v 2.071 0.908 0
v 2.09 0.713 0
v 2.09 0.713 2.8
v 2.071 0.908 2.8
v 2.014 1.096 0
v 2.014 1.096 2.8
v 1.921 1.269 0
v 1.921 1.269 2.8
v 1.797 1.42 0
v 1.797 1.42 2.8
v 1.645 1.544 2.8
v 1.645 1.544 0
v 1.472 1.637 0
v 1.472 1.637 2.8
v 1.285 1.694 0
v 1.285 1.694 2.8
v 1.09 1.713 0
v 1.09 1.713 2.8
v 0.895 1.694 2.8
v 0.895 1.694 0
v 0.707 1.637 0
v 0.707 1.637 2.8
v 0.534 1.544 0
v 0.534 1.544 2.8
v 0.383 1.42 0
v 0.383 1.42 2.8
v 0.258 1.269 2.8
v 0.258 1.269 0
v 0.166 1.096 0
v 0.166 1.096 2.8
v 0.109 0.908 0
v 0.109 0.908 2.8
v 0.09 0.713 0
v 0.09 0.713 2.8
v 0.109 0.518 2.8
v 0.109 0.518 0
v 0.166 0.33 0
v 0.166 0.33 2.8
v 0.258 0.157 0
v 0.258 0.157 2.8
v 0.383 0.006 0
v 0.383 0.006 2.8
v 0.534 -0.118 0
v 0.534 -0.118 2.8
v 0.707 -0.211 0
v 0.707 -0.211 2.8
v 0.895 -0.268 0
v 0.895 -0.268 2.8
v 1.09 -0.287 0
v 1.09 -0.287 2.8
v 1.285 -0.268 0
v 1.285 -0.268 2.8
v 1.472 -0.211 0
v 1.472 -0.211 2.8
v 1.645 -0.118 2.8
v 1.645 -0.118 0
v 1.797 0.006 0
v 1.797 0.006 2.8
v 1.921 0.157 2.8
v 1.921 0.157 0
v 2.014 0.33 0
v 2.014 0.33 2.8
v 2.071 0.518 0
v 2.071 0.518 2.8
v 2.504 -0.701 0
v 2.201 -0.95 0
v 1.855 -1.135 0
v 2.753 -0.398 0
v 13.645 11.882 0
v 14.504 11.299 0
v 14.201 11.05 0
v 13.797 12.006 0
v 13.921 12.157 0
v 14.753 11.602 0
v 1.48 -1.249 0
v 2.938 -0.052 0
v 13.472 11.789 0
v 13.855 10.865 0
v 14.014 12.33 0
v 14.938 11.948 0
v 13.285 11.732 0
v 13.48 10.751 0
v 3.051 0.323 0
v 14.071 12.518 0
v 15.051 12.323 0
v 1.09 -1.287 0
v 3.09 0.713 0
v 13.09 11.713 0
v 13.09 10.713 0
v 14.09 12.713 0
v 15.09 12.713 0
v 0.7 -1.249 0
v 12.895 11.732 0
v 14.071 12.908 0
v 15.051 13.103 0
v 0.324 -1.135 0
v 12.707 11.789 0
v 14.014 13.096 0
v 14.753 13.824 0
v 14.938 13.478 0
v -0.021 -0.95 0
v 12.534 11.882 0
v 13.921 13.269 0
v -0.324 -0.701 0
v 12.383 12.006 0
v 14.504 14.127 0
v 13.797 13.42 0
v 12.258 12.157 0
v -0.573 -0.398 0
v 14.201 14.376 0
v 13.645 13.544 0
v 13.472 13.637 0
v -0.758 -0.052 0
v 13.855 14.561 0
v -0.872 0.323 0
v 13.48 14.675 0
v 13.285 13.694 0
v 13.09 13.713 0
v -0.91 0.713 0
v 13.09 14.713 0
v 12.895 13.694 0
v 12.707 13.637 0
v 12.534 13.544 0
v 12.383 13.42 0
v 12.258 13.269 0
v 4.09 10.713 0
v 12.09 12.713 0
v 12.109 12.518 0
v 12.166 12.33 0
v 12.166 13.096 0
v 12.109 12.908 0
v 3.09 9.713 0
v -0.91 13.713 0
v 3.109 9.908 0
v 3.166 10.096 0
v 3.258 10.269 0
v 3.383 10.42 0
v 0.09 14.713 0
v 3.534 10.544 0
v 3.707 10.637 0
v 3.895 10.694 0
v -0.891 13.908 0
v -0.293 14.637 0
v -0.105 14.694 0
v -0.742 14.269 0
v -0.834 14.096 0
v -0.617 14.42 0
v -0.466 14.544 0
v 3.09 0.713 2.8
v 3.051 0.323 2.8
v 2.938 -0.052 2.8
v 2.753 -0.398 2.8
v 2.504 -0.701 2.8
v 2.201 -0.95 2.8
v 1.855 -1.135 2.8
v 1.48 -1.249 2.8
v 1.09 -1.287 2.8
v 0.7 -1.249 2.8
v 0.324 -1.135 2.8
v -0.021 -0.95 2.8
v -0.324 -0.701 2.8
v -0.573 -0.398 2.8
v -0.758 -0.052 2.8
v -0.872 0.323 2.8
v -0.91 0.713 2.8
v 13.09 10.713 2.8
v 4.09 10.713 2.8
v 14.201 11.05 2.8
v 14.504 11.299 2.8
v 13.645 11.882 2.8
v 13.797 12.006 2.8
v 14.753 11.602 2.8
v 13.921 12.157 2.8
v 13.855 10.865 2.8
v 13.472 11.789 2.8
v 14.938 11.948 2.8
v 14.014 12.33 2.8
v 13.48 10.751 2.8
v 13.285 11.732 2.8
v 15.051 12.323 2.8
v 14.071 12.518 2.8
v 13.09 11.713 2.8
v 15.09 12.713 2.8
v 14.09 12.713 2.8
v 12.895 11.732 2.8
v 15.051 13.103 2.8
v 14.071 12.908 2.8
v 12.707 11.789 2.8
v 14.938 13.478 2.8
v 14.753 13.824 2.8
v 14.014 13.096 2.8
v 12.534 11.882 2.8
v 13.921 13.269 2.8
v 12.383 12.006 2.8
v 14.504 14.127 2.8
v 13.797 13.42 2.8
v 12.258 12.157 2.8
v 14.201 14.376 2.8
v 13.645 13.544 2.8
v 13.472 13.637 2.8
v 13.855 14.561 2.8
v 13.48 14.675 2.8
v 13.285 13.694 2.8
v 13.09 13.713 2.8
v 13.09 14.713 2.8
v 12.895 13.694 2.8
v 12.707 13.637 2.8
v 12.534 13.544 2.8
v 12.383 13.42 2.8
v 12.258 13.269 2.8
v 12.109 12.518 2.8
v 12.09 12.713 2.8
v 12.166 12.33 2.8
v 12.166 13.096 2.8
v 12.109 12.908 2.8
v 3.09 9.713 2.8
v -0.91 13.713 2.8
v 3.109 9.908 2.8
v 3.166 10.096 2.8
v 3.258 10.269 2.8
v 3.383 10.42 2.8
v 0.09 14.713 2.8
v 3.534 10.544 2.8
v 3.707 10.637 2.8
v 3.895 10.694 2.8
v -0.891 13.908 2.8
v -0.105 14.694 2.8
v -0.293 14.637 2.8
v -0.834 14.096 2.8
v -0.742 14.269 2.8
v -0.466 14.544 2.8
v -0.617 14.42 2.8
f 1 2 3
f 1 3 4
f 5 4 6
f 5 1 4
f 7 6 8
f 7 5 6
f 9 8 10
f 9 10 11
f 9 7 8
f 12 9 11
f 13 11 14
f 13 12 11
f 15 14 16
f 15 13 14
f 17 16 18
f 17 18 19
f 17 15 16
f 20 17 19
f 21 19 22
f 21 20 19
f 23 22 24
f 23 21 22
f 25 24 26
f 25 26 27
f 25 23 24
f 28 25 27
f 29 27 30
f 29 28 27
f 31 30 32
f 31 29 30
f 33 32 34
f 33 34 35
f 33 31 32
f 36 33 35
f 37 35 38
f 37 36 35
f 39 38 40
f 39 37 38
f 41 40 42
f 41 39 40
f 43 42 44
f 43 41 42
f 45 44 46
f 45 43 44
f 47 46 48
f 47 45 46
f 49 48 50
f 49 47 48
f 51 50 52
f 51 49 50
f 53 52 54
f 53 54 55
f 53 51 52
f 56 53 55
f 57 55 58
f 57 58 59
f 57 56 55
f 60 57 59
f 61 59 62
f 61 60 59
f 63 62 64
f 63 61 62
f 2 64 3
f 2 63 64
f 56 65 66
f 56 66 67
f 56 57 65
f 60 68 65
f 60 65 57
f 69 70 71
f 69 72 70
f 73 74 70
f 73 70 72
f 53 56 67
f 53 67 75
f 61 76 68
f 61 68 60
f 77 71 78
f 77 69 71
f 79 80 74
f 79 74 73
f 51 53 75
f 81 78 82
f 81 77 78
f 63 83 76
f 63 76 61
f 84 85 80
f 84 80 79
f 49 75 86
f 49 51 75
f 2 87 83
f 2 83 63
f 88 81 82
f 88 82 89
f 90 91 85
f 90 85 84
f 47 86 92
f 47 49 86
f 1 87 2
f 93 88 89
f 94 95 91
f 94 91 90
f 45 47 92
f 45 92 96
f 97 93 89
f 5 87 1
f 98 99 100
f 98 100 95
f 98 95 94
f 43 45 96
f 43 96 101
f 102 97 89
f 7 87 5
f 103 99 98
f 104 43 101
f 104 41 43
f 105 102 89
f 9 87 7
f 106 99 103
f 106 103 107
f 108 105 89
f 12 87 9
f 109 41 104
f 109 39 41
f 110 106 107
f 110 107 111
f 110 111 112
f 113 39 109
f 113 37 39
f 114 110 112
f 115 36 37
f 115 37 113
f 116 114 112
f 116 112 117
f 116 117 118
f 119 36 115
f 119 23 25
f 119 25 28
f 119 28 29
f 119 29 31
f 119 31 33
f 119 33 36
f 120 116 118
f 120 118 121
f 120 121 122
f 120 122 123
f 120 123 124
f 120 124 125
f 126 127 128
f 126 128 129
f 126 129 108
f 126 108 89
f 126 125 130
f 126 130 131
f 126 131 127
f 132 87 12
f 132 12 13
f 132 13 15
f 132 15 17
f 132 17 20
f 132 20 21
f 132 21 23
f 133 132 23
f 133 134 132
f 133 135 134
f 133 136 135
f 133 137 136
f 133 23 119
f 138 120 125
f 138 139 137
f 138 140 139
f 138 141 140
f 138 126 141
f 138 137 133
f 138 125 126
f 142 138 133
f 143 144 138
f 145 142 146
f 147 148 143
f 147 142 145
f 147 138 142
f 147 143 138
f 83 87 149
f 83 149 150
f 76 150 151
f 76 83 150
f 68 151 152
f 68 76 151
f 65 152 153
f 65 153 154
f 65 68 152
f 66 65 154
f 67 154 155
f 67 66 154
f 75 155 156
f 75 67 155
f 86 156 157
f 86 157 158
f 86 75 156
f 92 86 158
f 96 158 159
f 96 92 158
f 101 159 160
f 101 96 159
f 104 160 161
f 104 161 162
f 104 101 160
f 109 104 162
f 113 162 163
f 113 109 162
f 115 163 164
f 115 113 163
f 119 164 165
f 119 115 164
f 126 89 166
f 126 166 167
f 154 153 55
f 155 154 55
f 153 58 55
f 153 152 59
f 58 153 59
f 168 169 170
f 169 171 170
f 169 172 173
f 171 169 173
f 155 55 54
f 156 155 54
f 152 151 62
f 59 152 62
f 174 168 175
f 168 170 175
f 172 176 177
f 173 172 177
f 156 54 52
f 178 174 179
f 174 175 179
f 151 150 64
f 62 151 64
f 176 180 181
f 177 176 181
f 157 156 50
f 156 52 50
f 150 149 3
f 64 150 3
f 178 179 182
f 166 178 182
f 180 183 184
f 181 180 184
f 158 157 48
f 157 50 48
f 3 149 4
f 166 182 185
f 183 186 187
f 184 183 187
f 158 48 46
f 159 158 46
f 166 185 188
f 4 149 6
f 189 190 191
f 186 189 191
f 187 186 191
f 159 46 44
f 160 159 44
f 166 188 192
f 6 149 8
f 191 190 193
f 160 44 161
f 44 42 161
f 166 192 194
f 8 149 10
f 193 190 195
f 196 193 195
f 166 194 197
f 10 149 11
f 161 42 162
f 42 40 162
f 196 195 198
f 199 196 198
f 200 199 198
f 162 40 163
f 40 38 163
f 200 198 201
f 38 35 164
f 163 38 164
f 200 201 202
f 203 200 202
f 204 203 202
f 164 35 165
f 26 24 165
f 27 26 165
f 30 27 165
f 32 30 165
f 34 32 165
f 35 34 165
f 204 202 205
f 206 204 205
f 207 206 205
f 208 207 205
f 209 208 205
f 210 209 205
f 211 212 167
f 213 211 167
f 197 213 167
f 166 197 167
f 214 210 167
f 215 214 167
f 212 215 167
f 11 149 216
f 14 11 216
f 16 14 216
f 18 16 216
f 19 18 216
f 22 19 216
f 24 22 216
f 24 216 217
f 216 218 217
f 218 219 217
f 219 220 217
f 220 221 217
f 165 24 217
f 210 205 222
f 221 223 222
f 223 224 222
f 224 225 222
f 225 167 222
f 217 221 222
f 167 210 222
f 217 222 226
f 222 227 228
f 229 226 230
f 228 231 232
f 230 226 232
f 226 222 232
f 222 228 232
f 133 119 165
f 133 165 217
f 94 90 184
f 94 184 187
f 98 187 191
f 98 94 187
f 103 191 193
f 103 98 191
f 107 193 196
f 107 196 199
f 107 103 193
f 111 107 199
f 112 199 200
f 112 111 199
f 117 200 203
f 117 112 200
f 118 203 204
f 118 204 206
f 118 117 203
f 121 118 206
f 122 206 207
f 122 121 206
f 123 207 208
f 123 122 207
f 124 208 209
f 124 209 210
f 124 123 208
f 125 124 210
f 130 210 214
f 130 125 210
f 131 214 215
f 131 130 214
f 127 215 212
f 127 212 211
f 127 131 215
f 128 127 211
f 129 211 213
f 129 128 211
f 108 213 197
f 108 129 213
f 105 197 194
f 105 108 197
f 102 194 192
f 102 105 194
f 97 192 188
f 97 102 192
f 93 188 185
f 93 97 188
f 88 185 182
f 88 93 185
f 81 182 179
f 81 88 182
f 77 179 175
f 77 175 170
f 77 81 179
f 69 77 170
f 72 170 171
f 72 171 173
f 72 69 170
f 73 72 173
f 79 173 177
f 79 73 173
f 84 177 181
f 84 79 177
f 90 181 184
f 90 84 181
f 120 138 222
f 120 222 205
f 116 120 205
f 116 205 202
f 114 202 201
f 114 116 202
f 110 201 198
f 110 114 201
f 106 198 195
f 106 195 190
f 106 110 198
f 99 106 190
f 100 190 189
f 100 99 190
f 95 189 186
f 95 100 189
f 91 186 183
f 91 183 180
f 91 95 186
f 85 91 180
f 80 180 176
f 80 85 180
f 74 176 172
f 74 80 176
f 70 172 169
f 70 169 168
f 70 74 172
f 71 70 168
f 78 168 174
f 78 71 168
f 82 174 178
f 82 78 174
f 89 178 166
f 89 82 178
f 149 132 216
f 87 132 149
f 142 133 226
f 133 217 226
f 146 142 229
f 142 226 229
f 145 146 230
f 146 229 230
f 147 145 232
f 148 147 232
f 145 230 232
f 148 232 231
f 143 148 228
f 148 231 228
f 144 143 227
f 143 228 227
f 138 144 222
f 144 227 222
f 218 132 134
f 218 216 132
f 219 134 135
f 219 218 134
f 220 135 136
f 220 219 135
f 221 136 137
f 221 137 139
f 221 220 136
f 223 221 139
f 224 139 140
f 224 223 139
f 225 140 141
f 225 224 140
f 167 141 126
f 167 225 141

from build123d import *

# Parameters (mm, degrees)
SKETCH1_R           = 1
BOSS_EXTRUDE2_DEPTH = 2.8
FILLET1_R           = 1


with BuildPart() as part:
    # Sketch1 → Boss-Extrude2 (new body)
    with BuildSketch(Plane.XY):
        with BuildLine():
            Line((-0.910186913, 0.71299639), (-0.910186913, 14.71299639))
            Line((-0.910186913, 14.71299639), (13.089813087, 14.71299639))
            ThreePointArc((13.089813087, 14.71299639), (15.089813087, 12.71299639), (13.089813087, 10.71299639))
            Line((13.089813087, 10.71299639), (3.089813087, 10.71299639))
            Line((3.089813087, 10.71299639), (3.089813087, 0.71299639))
            ThreePointArc((3.089813087, 0.71299639), (1.089813087, -1.28700361), (-0.910186913, 0.71299639))
        make_face()
        with Locations((1.089813087, 0.71299639)):
            Circle(SKETCH1_R, mode=Mode.SUBTRACT)
        with Locations((13.089813087, 12.71299639)):
            Circle(SKETCH1_R, mode=Mode.SUBTRACT)
    extrude(amount=BOSS_EXTRUDE2_DEPTH)

    # Fillet1
    fillet1_edges = [part.edges().sort_by_distance(p)[0] for p in [
        (3.089813087, 10.71299639, 1.4),
        (-0.910186913, 14.71299639, 1.4),
    ]]
    fillet(fillet1_edges, radius=FILLET1_R)


solid = part.part
